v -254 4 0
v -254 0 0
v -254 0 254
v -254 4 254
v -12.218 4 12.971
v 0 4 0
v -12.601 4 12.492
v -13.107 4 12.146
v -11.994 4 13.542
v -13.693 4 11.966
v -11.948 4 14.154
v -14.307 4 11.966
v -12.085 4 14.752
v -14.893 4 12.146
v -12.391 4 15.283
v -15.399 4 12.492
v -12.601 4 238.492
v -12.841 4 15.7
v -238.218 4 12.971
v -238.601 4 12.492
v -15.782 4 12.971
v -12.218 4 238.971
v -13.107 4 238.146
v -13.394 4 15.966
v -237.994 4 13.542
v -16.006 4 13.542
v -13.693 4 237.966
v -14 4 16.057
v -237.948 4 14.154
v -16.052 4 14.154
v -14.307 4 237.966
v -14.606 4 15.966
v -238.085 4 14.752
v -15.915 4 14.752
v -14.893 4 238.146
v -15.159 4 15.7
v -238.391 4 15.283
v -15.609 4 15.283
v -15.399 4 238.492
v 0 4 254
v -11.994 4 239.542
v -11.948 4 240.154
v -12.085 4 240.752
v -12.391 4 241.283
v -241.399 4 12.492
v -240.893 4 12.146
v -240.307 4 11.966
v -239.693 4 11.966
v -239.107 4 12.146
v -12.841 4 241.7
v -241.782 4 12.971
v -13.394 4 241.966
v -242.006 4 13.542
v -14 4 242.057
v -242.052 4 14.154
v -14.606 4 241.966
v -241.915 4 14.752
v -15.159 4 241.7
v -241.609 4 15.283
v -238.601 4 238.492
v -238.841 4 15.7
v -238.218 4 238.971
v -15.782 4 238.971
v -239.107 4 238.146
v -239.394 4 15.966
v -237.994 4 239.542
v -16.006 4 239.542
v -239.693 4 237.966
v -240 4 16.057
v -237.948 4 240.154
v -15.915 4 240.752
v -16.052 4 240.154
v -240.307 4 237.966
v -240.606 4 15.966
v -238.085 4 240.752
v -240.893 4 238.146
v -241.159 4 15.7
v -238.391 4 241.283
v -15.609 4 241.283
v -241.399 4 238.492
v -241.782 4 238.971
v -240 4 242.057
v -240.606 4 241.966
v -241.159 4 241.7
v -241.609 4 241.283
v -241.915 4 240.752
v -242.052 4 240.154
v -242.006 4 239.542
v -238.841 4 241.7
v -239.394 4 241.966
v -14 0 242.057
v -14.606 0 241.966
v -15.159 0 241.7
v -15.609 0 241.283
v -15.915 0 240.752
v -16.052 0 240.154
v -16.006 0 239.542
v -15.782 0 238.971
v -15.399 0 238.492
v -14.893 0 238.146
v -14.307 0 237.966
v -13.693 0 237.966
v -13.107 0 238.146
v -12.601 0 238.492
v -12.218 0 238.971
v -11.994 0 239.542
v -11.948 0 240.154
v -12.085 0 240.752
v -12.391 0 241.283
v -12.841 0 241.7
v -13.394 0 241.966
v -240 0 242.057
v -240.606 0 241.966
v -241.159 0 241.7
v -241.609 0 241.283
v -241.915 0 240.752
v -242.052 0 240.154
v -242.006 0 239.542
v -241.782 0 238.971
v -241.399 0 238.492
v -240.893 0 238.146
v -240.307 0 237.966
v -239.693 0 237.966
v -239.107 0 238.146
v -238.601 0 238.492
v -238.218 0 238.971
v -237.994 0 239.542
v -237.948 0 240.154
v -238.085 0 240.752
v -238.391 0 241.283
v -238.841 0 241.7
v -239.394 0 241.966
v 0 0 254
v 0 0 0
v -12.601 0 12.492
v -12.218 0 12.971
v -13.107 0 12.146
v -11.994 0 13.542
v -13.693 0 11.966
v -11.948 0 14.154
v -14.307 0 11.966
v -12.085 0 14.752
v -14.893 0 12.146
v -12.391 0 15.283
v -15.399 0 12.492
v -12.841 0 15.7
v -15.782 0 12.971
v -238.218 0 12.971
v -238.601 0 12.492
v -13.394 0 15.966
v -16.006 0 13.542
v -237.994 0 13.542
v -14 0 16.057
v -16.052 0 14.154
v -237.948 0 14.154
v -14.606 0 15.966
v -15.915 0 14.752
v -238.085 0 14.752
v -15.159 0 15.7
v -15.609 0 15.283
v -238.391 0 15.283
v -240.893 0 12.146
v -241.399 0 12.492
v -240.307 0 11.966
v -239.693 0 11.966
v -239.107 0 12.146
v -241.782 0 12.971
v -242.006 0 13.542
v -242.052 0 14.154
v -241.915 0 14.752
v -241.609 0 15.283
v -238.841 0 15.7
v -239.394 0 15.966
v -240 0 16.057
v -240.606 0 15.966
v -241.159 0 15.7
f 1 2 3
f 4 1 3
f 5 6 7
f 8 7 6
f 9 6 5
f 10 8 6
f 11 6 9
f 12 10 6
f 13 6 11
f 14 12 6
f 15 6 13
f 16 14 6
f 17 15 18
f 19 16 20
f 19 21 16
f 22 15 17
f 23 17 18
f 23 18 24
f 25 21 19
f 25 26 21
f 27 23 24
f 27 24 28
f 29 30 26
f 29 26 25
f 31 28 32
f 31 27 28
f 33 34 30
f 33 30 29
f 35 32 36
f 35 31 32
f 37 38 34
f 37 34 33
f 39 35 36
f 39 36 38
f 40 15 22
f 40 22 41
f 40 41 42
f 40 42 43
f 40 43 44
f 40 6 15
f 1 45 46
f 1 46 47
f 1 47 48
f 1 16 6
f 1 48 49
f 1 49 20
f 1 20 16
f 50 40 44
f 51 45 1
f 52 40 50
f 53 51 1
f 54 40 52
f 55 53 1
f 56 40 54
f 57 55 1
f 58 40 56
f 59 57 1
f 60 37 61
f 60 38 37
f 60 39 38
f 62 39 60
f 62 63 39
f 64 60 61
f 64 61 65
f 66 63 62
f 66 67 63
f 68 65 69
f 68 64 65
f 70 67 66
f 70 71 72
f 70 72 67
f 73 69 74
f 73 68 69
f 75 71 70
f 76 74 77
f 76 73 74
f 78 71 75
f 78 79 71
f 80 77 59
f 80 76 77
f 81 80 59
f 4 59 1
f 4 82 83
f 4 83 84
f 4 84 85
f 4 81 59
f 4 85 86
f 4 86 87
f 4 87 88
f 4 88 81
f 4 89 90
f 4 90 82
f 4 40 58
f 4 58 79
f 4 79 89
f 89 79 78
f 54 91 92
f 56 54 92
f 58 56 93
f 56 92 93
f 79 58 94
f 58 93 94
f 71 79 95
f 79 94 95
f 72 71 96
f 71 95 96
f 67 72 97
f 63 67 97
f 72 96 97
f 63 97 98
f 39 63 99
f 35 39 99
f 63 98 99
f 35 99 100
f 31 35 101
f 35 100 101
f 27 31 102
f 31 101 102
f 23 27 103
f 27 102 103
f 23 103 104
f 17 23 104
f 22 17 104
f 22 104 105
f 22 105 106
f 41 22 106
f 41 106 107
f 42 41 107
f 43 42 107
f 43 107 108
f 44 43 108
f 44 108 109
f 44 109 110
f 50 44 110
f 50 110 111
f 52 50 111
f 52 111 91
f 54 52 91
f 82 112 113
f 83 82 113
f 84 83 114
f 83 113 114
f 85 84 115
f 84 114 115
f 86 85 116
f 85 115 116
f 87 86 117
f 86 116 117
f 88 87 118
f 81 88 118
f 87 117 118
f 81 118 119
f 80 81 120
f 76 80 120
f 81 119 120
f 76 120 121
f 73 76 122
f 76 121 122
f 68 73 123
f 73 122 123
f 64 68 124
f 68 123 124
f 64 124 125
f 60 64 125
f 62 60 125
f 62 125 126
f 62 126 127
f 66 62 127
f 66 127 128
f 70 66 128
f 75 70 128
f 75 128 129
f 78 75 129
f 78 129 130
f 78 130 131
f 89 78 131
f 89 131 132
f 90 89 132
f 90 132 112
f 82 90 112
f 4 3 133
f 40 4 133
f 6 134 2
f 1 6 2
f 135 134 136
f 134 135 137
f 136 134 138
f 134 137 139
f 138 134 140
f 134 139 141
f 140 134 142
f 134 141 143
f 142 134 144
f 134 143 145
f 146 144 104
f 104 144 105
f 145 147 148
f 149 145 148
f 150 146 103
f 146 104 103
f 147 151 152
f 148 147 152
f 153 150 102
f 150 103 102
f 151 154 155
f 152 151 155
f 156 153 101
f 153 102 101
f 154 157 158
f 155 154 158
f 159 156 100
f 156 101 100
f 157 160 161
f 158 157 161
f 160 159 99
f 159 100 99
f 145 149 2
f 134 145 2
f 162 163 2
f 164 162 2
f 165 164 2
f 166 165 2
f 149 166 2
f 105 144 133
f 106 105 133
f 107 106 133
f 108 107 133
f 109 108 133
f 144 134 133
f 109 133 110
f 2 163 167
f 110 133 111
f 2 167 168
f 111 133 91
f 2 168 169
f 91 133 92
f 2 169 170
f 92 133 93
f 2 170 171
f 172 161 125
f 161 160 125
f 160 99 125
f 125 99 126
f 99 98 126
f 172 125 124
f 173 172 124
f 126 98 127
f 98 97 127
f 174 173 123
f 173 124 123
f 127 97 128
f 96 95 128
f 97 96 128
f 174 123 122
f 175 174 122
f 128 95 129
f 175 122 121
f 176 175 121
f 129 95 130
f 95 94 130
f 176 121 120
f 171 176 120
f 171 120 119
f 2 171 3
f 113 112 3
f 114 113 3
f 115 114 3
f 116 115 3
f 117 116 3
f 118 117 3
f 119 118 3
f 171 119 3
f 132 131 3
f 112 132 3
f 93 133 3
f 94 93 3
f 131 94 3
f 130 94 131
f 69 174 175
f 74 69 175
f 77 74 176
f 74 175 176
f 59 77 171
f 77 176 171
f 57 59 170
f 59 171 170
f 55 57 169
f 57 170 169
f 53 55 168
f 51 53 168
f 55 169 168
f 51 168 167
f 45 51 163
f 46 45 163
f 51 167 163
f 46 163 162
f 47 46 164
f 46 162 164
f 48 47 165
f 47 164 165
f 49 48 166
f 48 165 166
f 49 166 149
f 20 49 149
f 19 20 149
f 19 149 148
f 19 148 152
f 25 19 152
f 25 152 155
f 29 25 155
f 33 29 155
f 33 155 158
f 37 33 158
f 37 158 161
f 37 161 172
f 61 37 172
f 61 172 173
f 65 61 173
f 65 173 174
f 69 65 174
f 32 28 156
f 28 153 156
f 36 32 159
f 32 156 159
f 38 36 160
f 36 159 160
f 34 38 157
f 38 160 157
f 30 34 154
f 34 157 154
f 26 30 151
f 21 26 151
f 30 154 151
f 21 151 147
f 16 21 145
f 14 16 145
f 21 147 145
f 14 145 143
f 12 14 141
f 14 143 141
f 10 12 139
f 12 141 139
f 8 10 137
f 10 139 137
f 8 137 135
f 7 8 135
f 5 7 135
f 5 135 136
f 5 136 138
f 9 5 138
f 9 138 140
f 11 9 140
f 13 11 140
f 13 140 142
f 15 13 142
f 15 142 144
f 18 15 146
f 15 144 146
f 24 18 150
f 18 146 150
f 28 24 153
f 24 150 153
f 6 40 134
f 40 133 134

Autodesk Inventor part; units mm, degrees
ref_plane "YZ Plane" through (0, 0, 0) normal (1, 0, 0) x (0, 1, 0)
ref_plane "XZ Plane" through (0, 0, 0) normal (0, 1, 0) x (-1, 0, 0)
ref_plane "XY Plane" through (0, 0, 0) normal (0, 0, 1) x (1, 0, 0)
sketch "Sketch1" plane through (0, 0, 0) normal (0, 1, 0) x (-1, 0, 0)
  line L0 (254, 254) -> (0, 254)
  line L1 (0, 254) -> (0, 0)
  line L2 (0, 0) -> (254, 0)
  line L3 (254, 0) -> (254, 254)
extrude "Extrusion1" add sketch "Sketch1" along normal blind 4
sketch "Sketch2" plane through (0, 4, 0) normal (0, 1, 0) x (1, 0, 0)
  line L0 (-254, -254) -> (0, -254) projected
  line L1 (0, -254) -> (0, -240)
  line L2 (0, -254) -> (0, 0) projected
  line L3 (0, -240) -> (-14, -240)
  line L4 (-14, -240) -> (-14, -14)
  line L5 (-14, -14) -> (-240, -14)
  line L6 (-240, -14) -> (-240, -240)
  dimension "d2" = 14
  dimension "d3" = 14
  dimension "d4" = 226
  dimension "d5" = 226
  dimension "d6" = 226
hole "Hole1" at (-14, 4, 14) at (-14, 4, 240) at (-240, 4, 14) at (-240, 4, 240) direction (0, -1, 0) diameter 4.1148 depth 12.3
properties part number "lid_bakeout_box_2020_iqc"
